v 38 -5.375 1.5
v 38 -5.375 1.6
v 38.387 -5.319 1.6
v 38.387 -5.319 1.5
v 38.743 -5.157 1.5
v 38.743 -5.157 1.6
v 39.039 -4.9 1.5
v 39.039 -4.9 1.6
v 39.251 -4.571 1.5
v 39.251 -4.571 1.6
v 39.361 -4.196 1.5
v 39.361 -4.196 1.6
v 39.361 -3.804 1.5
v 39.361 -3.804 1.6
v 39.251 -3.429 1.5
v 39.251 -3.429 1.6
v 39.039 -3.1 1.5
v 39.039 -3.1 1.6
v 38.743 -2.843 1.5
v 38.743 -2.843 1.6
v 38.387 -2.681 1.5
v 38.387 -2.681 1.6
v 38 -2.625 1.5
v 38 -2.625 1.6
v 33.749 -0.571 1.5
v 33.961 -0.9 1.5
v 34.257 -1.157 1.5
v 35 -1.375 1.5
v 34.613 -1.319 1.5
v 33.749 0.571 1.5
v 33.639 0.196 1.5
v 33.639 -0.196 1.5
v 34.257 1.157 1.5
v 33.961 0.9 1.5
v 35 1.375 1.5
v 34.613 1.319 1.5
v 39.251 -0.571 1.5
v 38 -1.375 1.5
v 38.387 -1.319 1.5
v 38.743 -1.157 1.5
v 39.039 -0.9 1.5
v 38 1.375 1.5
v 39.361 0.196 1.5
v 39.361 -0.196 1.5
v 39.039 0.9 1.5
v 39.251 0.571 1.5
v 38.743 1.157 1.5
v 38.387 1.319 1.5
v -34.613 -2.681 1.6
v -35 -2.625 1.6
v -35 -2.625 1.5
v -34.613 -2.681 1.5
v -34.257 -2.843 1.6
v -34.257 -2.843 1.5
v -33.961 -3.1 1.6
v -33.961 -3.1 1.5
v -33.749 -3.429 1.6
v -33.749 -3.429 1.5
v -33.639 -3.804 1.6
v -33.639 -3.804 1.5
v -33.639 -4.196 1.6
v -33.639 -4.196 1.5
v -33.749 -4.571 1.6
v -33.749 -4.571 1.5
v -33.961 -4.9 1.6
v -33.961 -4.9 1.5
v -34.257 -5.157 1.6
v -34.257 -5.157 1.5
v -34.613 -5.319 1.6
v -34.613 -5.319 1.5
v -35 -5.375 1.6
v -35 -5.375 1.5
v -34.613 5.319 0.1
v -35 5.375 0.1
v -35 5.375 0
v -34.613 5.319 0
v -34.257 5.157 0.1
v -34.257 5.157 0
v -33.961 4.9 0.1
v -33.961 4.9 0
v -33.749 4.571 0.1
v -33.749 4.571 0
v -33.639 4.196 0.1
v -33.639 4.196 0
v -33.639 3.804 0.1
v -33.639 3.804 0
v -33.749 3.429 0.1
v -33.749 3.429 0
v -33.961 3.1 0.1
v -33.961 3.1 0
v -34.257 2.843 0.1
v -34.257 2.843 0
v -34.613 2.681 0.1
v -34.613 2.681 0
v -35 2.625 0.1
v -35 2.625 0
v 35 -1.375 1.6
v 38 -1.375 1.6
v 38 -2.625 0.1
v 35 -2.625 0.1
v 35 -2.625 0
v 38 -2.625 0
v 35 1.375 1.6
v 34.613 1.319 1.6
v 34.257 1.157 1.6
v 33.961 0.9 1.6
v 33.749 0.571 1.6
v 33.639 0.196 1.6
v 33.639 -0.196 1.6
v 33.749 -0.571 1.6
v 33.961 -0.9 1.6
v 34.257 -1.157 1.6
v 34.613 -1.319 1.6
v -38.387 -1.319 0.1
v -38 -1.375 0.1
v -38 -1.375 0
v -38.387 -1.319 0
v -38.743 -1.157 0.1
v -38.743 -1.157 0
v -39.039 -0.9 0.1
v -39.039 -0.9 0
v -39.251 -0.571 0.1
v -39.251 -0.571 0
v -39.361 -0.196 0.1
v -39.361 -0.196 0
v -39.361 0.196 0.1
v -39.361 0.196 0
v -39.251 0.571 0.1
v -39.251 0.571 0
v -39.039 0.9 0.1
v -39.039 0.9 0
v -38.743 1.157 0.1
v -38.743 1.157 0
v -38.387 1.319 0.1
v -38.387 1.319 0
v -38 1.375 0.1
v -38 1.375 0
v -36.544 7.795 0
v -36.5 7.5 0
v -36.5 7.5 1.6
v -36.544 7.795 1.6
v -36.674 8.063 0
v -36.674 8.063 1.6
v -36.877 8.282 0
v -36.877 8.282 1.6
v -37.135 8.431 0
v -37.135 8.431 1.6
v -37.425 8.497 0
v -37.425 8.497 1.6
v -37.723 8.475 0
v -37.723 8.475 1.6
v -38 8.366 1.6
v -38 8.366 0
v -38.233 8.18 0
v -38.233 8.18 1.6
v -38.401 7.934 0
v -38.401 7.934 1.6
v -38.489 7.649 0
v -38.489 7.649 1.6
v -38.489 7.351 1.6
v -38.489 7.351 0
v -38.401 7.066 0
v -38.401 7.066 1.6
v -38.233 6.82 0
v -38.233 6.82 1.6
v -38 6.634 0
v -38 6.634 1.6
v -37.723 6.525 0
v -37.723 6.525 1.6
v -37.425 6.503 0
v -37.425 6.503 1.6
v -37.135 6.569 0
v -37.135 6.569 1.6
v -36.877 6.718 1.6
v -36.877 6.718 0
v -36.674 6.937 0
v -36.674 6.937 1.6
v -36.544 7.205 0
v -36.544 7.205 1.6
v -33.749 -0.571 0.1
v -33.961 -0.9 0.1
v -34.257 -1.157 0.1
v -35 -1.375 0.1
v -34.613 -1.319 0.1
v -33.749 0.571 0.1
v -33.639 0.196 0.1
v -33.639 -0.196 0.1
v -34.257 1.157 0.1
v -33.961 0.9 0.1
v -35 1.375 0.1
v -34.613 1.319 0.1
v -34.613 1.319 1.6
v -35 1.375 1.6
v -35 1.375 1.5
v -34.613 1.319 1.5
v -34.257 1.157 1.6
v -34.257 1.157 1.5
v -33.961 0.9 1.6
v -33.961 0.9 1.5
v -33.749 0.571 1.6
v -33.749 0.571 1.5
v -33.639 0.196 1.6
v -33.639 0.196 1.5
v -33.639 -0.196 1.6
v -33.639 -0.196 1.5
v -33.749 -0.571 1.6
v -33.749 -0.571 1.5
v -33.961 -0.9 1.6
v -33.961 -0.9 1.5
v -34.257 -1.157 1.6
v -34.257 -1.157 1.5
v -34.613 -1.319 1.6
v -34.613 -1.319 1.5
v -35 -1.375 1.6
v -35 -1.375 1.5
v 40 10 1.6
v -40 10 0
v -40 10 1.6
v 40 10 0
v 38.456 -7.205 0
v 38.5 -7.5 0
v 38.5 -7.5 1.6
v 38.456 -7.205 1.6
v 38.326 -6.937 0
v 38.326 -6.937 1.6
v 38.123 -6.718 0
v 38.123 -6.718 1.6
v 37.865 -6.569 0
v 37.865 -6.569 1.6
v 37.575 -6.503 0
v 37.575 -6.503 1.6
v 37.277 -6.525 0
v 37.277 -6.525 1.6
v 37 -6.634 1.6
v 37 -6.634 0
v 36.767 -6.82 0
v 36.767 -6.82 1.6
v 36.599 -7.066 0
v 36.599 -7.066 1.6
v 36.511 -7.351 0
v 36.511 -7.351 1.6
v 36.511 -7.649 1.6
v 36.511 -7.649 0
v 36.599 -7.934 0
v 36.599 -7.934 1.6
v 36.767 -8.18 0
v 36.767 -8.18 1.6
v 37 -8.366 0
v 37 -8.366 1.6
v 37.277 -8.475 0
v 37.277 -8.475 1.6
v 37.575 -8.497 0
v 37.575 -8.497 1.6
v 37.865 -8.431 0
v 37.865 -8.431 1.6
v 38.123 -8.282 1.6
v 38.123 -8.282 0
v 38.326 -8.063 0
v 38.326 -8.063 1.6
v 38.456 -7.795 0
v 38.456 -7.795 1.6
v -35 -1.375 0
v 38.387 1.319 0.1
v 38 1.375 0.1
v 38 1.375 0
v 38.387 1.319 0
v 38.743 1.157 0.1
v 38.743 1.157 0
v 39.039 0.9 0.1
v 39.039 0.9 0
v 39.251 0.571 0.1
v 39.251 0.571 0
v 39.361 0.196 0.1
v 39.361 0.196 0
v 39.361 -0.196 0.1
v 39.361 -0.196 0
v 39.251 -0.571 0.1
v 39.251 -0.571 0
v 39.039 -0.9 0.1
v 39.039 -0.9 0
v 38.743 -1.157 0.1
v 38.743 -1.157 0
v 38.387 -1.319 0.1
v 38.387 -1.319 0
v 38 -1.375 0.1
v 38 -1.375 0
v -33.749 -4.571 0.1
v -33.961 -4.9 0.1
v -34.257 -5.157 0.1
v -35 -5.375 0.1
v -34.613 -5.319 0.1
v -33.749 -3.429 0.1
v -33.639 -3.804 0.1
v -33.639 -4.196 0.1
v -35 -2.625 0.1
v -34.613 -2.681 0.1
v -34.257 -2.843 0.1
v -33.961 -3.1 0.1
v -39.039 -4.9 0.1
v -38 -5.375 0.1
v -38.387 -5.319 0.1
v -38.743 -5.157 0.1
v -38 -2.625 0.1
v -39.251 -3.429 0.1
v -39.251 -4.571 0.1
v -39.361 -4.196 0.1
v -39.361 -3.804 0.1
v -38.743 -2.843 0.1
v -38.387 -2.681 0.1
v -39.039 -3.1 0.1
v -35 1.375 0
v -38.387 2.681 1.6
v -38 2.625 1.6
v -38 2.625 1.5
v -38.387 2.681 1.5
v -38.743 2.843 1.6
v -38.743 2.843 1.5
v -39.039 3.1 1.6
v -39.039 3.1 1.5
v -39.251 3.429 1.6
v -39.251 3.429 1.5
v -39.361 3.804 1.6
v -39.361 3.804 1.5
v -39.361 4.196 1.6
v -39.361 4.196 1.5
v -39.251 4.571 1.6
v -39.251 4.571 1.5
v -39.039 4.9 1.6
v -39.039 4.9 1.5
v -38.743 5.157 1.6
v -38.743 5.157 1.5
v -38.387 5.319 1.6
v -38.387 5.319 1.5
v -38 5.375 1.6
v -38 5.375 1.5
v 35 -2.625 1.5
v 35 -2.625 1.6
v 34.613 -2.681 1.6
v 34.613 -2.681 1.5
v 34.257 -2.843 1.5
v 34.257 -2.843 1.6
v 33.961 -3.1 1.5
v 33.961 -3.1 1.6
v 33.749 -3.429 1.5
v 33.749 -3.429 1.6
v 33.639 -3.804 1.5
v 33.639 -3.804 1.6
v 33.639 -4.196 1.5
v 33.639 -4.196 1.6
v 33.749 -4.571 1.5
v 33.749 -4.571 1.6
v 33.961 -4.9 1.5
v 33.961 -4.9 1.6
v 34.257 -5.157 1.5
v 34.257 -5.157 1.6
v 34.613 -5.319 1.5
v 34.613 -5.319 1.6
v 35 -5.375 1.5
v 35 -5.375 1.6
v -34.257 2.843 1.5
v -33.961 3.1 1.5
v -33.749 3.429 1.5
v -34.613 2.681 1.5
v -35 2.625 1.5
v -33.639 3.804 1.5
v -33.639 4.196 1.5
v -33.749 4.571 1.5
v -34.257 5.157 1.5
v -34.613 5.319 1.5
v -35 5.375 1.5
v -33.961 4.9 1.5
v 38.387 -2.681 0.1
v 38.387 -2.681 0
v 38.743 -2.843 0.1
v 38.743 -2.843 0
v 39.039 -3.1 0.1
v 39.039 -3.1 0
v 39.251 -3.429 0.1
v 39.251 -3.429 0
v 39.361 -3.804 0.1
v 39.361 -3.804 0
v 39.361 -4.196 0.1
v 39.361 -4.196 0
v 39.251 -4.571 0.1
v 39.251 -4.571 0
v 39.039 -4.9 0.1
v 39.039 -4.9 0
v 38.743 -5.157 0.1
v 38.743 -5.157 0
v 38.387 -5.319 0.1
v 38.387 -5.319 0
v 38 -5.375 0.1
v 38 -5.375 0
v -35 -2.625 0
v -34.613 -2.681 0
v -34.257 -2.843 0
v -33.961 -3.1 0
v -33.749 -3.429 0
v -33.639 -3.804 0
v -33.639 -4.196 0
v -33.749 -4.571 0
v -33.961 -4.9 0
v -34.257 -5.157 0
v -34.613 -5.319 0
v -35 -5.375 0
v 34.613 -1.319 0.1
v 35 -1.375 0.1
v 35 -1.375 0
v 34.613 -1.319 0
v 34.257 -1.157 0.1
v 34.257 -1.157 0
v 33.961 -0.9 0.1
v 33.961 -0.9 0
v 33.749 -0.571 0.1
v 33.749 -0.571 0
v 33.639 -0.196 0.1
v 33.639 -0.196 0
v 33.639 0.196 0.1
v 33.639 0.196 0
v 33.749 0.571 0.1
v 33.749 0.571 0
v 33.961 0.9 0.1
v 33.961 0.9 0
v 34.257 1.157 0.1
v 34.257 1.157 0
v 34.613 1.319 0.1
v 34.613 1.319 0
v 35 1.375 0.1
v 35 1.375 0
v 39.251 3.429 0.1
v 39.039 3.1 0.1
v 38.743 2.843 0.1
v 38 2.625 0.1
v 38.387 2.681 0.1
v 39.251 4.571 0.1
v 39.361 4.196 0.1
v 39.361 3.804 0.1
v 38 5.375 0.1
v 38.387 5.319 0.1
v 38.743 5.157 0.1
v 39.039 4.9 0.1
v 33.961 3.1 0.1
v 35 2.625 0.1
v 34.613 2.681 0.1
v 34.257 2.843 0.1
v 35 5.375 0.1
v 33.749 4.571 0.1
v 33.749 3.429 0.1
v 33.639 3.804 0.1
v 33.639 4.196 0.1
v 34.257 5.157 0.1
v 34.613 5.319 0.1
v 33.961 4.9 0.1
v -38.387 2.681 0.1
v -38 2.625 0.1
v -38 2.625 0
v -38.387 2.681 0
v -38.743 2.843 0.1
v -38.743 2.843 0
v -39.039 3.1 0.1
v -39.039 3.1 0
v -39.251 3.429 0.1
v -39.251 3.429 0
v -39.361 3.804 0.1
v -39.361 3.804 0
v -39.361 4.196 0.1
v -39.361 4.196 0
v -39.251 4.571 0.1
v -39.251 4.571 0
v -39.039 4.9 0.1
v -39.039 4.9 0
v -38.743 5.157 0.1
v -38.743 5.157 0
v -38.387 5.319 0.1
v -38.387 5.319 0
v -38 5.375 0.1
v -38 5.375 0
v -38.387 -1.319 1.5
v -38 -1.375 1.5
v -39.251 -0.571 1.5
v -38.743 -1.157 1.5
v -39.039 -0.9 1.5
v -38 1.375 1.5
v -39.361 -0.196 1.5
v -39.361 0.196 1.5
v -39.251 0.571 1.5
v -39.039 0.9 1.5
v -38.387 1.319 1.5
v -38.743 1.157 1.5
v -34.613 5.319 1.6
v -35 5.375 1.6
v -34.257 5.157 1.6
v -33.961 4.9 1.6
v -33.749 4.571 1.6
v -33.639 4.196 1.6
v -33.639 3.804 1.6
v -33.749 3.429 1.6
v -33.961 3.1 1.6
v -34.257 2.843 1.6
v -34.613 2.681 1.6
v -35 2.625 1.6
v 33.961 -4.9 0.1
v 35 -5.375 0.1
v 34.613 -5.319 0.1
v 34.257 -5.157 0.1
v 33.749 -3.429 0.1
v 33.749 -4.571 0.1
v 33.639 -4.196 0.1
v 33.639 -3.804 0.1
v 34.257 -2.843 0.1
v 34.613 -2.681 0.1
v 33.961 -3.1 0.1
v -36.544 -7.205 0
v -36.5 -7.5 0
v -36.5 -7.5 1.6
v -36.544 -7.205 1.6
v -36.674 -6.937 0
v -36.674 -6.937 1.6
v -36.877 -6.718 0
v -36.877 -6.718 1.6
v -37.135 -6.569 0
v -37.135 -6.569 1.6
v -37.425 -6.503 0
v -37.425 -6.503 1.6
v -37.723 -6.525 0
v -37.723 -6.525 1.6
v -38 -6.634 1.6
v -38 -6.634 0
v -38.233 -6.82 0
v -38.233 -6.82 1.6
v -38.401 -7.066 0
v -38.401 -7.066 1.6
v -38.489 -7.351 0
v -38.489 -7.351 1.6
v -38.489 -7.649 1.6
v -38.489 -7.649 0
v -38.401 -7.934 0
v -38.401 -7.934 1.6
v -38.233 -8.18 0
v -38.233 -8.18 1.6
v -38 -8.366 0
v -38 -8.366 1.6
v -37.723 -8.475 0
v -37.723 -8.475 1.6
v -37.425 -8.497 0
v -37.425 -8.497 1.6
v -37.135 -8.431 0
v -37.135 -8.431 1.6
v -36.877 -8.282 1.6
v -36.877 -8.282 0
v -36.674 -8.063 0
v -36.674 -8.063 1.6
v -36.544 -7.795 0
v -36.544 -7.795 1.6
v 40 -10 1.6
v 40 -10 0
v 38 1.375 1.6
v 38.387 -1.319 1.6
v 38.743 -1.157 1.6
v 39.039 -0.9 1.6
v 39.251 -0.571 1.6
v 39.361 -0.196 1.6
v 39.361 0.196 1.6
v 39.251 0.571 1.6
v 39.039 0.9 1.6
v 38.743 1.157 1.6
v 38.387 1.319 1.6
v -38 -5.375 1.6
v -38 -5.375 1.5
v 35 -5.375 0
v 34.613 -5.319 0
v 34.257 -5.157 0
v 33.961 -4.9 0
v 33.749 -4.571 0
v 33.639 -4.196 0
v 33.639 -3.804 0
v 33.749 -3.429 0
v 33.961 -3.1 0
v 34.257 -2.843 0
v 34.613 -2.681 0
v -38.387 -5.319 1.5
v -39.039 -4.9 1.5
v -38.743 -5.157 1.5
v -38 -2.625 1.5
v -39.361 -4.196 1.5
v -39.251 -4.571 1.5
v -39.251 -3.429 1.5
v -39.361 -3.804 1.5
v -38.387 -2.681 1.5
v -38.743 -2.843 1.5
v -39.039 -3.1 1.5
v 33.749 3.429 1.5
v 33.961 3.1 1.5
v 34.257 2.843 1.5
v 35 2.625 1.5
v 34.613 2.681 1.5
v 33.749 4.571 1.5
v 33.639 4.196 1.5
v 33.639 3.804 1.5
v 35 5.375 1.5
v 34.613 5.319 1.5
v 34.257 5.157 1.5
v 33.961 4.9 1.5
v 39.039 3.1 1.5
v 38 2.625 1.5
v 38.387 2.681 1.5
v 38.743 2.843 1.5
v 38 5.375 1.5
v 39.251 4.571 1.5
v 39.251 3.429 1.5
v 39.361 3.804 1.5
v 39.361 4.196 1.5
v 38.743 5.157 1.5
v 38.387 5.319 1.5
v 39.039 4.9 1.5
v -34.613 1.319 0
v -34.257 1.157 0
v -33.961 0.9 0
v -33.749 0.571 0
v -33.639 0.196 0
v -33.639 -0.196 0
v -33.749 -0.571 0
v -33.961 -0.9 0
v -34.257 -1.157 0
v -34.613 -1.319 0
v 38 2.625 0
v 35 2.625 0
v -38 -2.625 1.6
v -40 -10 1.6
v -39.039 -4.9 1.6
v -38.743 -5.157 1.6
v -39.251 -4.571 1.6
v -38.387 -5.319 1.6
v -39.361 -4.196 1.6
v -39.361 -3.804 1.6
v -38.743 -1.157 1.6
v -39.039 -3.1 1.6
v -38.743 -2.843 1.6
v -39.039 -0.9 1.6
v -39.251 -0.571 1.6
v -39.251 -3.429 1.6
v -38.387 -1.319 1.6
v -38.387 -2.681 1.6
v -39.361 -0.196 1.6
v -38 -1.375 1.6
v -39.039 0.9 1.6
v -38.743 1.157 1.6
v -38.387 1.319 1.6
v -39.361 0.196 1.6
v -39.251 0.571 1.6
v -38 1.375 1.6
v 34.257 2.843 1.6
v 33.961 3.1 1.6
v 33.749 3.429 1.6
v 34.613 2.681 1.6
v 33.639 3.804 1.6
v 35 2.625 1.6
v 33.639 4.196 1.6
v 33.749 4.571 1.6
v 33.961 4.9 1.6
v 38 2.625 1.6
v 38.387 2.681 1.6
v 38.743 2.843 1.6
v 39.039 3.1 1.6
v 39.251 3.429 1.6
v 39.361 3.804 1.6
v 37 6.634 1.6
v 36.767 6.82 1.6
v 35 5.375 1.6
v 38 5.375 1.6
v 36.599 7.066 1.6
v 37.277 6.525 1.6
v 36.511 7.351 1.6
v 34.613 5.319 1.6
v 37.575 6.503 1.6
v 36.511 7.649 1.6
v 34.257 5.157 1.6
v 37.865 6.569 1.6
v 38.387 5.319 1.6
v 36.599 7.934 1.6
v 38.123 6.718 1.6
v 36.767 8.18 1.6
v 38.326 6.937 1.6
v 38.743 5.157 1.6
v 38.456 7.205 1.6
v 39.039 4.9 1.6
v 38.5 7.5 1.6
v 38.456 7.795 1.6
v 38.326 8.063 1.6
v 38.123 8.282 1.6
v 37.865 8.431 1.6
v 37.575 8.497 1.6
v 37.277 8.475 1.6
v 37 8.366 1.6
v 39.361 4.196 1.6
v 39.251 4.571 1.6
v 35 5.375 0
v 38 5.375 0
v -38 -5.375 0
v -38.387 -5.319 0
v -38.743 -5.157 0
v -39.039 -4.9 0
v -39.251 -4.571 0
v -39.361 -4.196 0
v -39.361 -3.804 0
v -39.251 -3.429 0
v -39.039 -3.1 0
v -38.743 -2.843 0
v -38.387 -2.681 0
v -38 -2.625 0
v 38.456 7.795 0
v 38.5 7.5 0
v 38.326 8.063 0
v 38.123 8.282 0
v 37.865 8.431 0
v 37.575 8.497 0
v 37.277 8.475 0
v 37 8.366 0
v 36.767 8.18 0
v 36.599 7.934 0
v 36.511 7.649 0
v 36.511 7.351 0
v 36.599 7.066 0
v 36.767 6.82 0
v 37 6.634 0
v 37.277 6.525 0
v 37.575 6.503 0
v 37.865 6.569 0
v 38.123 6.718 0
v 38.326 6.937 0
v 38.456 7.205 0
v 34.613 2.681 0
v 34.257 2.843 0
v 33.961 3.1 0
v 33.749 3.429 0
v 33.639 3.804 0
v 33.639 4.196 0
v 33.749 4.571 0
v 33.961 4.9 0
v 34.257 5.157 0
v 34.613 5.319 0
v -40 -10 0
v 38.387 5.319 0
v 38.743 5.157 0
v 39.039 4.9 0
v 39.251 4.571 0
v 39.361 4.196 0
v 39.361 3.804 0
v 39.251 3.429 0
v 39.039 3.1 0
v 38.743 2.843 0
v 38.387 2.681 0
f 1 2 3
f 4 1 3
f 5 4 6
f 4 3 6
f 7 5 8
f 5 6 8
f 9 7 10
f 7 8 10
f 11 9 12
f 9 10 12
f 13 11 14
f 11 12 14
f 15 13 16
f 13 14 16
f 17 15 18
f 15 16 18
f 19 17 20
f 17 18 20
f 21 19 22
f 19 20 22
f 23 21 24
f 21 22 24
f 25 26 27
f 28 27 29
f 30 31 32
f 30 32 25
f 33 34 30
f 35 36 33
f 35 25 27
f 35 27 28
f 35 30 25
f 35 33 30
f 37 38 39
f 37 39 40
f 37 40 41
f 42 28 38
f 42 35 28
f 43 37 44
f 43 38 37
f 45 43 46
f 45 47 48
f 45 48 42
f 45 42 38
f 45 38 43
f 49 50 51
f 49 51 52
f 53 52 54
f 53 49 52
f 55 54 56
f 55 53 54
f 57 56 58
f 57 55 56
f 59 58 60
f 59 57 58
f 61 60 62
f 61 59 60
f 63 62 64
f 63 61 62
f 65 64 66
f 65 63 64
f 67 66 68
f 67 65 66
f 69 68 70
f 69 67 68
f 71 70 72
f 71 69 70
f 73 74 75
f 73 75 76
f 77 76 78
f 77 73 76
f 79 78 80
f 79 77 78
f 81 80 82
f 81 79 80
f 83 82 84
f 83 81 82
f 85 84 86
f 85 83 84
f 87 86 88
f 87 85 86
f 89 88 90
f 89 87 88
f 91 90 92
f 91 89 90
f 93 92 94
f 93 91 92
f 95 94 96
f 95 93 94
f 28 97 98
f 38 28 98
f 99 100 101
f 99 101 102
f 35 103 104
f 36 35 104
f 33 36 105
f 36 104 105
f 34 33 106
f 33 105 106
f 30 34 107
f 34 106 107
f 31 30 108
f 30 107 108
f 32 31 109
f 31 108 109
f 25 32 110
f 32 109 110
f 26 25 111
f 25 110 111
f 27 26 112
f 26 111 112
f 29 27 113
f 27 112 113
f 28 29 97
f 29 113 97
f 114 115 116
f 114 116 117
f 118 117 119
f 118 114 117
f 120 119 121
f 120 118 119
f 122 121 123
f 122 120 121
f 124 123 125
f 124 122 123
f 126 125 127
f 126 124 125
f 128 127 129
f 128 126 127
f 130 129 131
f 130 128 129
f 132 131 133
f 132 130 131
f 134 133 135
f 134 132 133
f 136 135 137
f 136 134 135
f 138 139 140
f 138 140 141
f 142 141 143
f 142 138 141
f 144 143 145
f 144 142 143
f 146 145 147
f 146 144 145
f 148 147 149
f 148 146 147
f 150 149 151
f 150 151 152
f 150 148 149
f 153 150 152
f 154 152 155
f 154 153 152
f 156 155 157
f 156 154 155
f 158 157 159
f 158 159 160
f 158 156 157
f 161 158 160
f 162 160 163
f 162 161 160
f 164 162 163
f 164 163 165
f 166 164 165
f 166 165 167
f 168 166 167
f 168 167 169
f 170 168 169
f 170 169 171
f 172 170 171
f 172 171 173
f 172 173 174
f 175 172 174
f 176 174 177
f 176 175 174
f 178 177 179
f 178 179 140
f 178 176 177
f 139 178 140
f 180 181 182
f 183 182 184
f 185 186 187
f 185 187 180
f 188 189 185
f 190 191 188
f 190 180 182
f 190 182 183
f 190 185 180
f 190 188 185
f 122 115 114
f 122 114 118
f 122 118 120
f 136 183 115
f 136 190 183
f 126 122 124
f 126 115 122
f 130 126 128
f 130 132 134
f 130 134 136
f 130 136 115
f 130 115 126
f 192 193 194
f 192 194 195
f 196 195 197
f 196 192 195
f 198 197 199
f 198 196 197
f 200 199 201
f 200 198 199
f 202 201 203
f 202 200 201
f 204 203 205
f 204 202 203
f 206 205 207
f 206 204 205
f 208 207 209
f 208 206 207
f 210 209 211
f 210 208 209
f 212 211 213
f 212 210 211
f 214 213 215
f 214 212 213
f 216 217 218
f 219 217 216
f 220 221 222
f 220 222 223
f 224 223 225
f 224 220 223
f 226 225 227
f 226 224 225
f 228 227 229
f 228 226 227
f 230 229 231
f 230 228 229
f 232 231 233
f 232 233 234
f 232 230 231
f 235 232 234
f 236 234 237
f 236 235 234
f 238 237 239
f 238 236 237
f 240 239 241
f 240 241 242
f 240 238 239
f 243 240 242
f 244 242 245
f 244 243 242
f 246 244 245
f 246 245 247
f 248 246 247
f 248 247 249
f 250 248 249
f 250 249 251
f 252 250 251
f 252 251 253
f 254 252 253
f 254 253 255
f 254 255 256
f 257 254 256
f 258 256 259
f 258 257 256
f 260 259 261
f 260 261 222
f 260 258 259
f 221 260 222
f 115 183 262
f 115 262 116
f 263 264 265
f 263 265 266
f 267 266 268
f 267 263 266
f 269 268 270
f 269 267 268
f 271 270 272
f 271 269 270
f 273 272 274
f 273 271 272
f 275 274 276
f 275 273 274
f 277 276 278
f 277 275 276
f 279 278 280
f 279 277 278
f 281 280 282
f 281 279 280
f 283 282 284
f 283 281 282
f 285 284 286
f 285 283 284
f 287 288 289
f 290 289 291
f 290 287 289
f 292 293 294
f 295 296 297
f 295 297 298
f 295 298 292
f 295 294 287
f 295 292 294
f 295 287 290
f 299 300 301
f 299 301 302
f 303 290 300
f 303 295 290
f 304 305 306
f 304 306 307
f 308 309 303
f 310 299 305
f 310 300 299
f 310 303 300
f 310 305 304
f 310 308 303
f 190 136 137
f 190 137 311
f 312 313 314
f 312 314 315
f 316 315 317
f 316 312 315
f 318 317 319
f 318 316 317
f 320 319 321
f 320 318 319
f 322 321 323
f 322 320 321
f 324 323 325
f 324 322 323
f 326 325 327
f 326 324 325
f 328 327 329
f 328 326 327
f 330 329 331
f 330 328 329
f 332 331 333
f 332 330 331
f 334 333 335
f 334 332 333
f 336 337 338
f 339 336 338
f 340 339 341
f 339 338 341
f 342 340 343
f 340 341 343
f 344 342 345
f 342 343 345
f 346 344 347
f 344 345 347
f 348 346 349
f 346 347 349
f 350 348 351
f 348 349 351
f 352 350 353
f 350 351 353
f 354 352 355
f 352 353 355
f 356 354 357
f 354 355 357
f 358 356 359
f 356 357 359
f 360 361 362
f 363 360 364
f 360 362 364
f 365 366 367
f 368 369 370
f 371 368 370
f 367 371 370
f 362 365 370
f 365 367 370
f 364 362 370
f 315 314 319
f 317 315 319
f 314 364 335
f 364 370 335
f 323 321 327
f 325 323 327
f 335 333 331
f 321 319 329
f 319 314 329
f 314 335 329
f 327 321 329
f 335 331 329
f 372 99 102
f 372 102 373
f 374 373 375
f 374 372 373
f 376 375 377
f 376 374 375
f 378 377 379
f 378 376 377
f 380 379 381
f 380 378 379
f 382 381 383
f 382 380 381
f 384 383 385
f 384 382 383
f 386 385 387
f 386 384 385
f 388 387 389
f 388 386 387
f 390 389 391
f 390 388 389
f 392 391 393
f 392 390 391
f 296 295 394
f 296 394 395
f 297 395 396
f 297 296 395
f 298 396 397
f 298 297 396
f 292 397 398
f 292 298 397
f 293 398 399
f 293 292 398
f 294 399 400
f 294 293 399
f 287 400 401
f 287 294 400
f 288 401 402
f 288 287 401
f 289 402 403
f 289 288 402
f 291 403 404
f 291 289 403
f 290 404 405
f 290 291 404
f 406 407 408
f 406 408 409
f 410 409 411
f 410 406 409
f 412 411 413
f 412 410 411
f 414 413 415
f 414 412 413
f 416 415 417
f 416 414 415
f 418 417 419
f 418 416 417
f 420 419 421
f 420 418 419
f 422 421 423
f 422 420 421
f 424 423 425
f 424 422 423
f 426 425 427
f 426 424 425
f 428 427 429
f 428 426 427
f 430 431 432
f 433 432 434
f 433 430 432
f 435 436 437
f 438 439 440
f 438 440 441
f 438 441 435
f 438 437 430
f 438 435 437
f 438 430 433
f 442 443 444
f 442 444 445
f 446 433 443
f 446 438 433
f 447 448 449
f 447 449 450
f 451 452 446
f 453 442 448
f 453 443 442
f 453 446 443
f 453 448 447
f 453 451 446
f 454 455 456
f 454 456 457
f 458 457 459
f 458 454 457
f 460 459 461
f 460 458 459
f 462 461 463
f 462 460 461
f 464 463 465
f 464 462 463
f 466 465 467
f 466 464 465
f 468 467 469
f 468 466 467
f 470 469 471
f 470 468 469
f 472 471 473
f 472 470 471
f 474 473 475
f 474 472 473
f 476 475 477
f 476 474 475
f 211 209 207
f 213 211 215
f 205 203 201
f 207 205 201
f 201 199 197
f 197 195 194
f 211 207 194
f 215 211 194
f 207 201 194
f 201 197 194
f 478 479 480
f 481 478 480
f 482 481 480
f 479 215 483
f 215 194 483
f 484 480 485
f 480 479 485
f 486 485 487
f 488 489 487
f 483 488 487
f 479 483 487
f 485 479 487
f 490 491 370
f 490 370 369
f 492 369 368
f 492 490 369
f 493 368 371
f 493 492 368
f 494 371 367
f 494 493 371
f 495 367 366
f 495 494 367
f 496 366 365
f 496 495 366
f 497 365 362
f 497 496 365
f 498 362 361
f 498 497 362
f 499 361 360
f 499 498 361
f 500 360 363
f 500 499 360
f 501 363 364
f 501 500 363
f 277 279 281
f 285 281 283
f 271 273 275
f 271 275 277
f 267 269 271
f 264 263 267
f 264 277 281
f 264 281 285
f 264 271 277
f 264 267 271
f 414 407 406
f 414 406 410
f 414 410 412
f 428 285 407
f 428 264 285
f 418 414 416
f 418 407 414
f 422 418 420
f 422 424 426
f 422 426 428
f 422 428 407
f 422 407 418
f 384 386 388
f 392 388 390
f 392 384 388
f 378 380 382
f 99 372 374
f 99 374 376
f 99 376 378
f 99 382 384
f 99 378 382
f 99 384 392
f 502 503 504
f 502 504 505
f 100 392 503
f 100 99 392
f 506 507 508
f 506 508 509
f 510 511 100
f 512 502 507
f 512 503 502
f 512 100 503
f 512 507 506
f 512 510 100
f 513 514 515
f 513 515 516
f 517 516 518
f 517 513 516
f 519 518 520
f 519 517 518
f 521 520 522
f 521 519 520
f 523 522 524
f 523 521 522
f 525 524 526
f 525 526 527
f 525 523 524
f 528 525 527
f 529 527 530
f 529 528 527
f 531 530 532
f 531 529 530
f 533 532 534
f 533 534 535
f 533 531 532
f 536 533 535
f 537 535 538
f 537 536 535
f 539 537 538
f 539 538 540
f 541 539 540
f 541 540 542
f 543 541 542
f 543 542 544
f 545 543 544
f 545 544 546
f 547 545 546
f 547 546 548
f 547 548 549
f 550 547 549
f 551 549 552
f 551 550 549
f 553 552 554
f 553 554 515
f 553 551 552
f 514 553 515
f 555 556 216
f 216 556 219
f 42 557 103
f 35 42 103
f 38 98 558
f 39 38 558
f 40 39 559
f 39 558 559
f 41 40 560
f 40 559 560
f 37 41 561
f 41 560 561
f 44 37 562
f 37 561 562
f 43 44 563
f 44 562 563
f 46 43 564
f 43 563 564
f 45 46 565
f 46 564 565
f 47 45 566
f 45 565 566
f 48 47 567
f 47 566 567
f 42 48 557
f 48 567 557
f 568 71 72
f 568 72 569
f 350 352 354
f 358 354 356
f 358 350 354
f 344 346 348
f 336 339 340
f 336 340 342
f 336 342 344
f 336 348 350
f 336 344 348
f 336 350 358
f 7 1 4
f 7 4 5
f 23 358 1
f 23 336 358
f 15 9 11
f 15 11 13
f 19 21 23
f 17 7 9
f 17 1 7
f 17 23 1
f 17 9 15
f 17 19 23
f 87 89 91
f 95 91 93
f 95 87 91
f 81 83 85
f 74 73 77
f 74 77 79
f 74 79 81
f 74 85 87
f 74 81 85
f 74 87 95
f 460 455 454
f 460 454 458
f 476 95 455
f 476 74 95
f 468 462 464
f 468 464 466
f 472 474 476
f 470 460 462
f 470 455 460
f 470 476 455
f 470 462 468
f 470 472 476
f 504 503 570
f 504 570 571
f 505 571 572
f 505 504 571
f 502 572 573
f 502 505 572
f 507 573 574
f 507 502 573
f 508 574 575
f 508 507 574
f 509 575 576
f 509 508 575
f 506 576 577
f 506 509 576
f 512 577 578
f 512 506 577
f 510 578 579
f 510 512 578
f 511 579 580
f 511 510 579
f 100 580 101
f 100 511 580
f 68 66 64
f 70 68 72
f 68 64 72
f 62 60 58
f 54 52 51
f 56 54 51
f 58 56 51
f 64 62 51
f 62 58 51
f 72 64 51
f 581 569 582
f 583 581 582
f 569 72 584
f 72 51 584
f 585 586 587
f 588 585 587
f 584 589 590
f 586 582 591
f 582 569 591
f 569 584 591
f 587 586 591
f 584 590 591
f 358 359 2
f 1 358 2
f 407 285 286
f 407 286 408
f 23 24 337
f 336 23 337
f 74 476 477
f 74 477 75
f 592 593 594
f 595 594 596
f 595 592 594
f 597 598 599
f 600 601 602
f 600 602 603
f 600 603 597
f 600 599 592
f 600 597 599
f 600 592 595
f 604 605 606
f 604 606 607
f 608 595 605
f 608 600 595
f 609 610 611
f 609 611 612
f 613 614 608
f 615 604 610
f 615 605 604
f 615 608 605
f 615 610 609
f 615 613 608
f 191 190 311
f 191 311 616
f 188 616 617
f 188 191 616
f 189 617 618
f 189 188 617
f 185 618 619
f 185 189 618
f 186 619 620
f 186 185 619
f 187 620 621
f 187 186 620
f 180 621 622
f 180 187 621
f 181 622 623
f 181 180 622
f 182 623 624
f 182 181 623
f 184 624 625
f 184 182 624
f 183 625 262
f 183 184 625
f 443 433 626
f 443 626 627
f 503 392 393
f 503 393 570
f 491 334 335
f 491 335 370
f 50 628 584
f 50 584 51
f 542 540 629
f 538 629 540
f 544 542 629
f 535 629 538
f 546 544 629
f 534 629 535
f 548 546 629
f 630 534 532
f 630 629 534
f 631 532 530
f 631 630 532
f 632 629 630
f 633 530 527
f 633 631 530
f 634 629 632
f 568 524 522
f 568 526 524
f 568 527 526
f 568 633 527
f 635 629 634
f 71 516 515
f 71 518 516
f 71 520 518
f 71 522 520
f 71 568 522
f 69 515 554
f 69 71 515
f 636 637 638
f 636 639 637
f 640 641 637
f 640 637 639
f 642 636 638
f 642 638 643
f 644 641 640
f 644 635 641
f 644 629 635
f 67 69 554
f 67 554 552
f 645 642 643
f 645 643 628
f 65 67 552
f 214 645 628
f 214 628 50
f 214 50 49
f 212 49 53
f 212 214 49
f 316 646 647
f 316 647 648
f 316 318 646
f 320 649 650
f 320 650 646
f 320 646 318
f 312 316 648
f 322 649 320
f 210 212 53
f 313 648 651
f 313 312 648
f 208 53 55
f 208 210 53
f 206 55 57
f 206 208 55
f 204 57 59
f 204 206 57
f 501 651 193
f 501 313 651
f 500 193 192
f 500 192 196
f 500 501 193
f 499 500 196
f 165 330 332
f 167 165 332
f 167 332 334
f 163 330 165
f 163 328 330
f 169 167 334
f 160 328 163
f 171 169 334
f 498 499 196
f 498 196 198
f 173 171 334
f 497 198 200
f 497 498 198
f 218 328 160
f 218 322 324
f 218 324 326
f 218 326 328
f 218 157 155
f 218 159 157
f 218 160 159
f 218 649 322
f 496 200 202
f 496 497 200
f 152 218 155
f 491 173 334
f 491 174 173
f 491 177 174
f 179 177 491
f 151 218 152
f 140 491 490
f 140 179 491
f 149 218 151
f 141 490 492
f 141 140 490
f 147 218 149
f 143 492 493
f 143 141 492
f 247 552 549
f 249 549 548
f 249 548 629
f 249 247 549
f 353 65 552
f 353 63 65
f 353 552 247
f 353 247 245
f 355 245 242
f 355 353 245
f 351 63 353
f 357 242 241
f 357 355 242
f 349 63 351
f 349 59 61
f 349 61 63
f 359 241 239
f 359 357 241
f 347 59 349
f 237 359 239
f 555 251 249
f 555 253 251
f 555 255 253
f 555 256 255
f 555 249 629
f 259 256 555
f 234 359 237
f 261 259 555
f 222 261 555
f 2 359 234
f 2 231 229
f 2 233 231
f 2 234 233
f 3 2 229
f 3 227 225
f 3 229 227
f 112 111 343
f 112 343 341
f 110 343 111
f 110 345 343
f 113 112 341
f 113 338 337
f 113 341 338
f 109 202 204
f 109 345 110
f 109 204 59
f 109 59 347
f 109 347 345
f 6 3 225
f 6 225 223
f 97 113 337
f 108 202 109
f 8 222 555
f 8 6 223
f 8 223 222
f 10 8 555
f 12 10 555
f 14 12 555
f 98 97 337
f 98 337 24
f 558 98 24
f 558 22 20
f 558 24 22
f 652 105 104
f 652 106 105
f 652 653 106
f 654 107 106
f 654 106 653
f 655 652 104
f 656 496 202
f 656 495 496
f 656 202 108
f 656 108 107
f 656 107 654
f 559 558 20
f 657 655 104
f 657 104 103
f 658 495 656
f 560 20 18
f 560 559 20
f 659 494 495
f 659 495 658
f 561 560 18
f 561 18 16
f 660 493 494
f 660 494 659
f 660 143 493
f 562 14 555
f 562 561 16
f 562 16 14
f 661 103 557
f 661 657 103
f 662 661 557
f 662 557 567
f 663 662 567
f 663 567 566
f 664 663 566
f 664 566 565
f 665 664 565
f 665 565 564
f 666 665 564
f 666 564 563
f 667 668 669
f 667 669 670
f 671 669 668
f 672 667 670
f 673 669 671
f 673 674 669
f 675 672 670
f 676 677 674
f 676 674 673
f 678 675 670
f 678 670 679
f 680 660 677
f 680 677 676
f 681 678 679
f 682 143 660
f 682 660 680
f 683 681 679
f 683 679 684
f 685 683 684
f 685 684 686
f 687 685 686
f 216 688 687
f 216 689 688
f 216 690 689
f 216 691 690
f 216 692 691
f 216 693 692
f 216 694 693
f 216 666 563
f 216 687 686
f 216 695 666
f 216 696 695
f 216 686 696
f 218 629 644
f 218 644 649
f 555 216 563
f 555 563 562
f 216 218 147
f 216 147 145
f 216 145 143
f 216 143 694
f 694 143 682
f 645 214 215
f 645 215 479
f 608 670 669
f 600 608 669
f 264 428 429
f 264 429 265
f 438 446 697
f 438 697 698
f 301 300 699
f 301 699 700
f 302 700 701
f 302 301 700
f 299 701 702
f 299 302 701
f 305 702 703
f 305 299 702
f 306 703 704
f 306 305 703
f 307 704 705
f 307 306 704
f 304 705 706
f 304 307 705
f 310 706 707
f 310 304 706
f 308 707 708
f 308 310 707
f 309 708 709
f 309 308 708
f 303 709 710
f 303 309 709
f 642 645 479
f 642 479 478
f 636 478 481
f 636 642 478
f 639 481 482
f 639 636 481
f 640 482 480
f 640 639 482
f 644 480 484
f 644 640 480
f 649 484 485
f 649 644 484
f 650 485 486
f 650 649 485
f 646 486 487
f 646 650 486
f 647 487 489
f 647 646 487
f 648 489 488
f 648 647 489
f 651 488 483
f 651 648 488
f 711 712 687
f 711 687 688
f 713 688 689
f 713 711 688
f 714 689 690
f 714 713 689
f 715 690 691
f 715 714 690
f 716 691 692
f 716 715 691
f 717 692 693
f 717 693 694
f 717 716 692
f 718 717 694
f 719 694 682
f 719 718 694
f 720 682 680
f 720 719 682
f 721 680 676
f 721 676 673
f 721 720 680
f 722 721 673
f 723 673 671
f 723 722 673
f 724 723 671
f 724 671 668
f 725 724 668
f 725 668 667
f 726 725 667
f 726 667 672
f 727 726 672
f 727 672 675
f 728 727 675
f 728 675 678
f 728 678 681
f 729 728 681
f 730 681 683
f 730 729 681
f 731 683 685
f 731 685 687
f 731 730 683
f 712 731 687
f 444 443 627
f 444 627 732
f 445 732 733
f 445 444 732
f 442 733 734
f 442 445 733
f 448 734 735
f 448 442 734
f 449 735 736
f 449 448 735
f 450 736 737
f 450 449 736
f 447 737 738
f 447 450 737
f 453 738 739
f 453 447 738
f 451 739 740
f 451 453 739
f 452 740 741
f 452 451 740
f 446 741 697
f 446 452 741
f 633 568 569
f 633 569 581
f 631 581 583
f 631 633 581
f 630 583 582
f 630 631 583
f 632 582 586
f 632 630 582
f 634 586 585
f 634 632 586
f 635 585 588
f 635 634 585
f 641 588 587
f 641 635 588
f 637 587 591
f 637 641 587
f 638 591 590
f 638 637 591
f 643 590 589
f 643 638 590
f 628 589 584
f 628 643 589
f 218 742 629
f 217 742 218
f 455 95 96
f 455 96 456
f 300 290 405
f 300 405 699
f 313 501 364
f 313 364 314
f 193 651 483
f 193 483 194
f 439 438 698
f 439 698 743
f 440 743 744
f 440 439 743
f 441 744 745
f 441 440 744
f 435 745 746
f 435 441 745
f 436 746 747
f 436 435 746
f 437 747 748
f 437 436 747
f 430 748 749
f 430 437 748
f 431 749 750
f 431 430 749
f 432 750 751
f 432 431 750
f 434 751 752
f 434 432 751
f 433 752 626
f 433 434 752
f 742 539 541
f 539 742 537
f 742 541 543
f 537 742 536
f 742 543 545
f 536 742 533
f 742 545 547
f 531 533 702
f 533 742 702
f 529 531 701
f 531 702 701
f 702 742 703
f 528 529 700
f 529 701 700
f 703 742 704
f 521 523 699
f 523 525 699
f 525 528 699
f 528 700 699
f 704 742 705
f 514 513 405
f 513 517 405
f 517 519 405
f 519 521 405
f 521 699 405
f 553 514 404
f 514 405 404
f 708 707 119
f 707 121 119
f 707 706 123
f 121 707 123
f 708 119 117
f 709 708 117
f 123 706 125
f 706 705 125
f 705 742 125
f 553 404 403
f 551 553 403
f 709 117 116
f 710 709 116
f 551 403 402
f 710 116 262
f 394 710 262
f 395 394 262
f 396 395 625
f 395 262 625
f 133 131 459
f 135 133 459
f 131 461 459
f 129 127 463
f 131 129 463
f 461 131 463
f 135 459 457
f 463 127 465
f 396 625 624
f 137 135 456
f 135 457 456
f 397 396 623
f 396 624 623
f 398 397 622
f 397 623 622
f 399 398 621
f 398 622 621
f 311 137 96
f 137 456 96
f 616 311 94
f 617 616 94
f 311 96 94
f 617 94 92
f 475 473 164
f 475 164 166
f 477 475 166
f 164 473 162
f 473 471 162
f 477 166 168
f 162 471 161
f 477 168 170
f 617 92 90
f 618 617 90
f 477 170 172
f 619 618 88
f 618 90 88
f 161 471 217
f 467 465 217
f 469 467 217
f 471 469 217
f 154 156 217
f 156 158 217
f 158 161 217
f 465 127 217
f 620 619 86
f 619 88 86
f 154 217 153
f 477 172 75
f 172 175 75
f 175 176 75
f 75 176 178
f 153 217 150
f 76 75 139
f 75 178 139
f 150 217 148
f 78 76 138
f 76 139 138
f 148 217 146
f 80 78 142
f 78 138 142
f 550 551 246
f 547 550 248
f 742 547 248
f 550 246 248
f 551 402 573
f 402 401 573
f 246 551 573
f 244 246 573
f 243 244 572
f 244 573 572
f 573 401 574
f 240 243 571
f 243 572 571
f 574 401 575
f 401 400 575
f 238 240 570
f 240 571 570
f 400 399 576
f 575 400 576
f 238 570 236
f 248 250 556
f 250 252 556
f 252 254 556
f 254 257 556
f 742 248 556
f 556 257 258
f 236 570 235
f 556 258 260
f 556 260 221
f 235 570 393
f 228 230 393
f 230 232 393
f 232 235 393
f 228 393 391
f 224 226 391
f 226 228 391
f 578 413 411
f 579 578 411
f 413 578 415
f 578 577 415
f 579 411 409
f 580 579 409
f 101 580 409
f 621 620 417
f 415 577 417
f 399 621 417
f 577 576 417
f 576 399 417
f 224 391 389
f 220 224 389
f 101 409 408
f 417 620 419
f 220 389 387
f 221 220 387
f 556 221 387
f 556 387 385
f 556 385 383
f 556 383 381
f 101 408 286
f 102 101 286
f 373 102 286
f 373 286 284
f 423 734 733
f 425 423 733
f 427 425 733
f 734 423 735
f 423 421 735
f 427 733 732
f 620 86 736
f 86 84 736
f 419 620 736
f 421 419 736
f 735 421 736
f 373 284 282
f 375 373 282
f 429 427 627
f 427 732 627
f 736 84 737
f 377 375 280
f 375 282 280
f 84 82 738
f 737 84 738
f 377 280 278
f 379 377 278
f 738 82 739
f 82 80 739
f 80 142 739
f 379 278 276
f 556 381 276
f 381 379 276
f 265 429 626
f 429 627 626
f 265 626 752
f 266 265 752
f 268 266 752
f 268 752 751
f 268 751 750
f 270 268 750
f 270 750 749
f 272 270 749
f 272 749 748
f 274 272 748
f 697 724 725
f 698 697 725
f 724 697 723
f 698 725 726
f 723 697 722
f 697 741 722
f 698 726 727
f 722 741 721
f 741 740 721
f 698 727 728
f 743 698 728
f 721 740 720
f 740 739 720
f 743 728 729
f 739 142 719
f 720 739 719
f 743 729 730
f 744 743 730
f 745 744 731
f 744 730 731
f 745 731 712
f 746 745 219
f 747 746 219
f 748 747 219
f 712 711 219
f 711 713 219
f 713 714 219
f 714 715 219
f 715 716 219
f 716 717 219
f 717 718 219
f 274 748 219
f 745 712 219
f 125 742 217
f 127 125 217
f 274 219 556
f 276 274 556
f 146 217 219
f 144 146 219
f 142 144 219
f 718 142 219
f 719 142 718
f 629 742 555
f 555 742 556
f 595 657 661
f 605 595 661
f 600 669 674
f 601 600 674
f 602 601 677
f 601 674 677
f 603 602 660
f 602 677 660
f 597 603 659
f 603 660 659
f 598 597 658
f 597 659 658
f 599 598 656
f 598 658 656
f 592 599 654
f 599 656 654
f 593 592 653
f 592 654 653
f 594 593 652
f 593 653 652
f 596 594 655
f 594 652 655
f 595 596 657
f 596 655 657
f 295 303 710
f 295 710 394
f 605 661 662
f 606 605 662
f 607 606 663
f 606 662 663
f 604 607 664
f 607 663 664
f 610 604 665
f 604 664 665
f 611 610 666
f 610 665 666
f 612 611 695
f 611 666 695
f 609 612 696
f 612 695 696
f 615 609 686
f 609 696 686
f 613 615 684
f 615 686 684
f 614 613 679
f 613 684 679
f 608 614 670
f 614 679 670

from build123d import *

# Parameters (mm, degrees)
SKETCH_1_W          = 80
SKETCH_1_H          = 20
SKETCH_1_R          = 1
EXTRUDE_1_DEPTH     = 1.6
CUT_EXTRUDE_1_DEPTH = 0.1
CUT_EXTRUDE_START   = -0.1
CUT_EXTRUDE_2_DEPTH = 0.1


with BuildPart() as part:
    # Эскиз1 → Бобышка-Вытянуть1 (new body)
    with BuildSketch(Plane.XY):
        Rectangle(SKETCH_1_W, SKETCH_1_H)
        with Locations((-37.5, 7.5)):
            Circle(SKETCH_1_R, mode=Mode.SUBTRACT)
        with Locations((-37.5, -7.5)):
            Circle(SKETCH_1_R, mode=Mode.SUBTRACT)
        with Locations((37.5, -7.5)):
            Circle(SKETCH_1_R, mode=Mode.SUBTRACT)
        with Locations((37.5, 7.5)):
            Circle(SKETCH_1_R, mode=Mode.SUBTRACT)
    extrude(amount=EXTRUDE_1_DEPTH)

    # Эскиз2 → Вырез-Вытянуть1 (cut)
    with BuildSketch(Plane.XY.offset(1.6)):
        with BuildLine():
            Line((-38, -2.625), (-35, -2.625))
            ThreePointArc((-35, -2.625), (-33.625, -4), (-35, -5.375))
            Line((-35, -5.375), (-38, -5.375))
            ThreePointArc((-38, -5.375), (-39.375, -4), (-38, -2.625))
        make_face()
        with BuildLine():
            Line((-38, 1.375), (-35, 1.375))
            ThreePointArc((-35, 1.375), (-33.625, 0), (-35, -1.375))
            Line((-35, -1.375), (-38, -1.375))
            ThreePointArc((-38, -1.375), (-39.375, 0), (-38, 1.375))
        make_face()
        with BuildLine():
            Line((-38, 5.375), (-35, 5.375))
            ThreePointArc((-35, 5.375), (-33.625, 4), (-35, 2.625))
            Line((-35, 2.625), (-38, 2.625))
            ThreePointArc((-38, 2.625), (-39.375, 4), (-38, 5.375))
        make_face()
        with BuildLine():
            Line((38, -2.625), (35, -2.625))
            ThreePointArc((35, -2.625), (33.625, -4), (35, -5.375))
            Line((35, -5.375), (38, -5.375))
            ThreePointArc((38, -5.375), (39.375, -4), (38, -2.625))
        make_face()
        with BuildLine():
            Line((38, 1.375), (35, 1.375))
            ThreePointArc((35, 1.375), (33.625, 0), (35, -1.375))
            Line((35, -1.375), (38, -1.375))
            ThreePointArc((38, -1.375), (39.375, 0), (38, 1.375))
        make_face()
        with BuildLine():
            Line((38, 5.375), (35, 5.375))
            ThreePointArc((35, 5.375), (33.625, 4), (35, 2.625))
            Line((35, 2.625), (38, 2.625))
            ThreePointArc((38, 2.625), (39.375, 4), (38, 5.375))
        make_face()
    extrude(amount=-CUT_EXTRUDE_1_DEPTH, mode=Mode.SUBTRACT)

    # Эскиз3 → Вырез-Вытянуть2 (cut)
    with BuildSketch(Plane(origin=(0, 0, 0), x_dir=(-1, 0, 0), z_dir=(0, 0, -1)).offset(CUT_EXTRUDE_START)):
        with BuildLine():
            Line((38, 1.375), (35, 1.375))
            ThreePointArc((35, 1.375), (33.625, 0), (35, -1.375))
            Line((35, -1.375), (38, -1.375))
            ThreePointArc((38, -1.375), (39.375, 0), (38, 1.375))
        make_face()
        with BuildLine():
            Line((38, -2.625), (35, -2.625))
            ThreePointArc((35, -2.625), (33.625, -4), (35, -5.375))
            Line((35, -5.375), (38, -5.375))
            ThreePointArc((38, -5.375), (39.375, -4), (38, -2.625))
        make_face()
        with BuildLine():
            Line((38, 5.375), (35, 5.375))
            ThreePointArc((35, 5.375), (33.625, 4), (35, 2.625))
            Line((35, 2.625), (38, 2.625))
            ThreePointArc((38, 2.625), (39.375, 4), (38, 5.375))
        make_face()
        with BuildLine():
            Line((-35, 1.375), (-38, 1.375))
            ThreePointArc((-38, 1.375), (-39.375, 0), (-38, -1.375))
            Line((-38, -1.375), (-35, -1.375))
            ThreePointArc((-35, -1.375), (-33.625, 0), (-35, 1.375))
        make_face()
        with BuildLine():
            Line((-35, -2.625), (-38, -2.625))
            ThreePointArc((-38, -2.625), (-39.375, -4), (-38, -5.375))
            Line((-38, -5.375), (-35, -5.375))
            ThreePointArc((-35, -5.375), (-33.625, -4), (-35, -2.625))
        make_face()
        with BuildLine():
            Line((-35, 5.375), (-38, 5.375))
            ThreePointArc((-38, 5.375), (-39.375, 4), (-38, 2.625))
            Line((-38, 2.625), (-35, 2.625))
            ThreePointArc((-35, 2.625), (-33.625, 4), (-35, 5.375))
        make_face()
    extrude(amount=CUT_EXTRUDE_2_DEPTH, mode=Mode.SUBTRACT)


solid = part.part
